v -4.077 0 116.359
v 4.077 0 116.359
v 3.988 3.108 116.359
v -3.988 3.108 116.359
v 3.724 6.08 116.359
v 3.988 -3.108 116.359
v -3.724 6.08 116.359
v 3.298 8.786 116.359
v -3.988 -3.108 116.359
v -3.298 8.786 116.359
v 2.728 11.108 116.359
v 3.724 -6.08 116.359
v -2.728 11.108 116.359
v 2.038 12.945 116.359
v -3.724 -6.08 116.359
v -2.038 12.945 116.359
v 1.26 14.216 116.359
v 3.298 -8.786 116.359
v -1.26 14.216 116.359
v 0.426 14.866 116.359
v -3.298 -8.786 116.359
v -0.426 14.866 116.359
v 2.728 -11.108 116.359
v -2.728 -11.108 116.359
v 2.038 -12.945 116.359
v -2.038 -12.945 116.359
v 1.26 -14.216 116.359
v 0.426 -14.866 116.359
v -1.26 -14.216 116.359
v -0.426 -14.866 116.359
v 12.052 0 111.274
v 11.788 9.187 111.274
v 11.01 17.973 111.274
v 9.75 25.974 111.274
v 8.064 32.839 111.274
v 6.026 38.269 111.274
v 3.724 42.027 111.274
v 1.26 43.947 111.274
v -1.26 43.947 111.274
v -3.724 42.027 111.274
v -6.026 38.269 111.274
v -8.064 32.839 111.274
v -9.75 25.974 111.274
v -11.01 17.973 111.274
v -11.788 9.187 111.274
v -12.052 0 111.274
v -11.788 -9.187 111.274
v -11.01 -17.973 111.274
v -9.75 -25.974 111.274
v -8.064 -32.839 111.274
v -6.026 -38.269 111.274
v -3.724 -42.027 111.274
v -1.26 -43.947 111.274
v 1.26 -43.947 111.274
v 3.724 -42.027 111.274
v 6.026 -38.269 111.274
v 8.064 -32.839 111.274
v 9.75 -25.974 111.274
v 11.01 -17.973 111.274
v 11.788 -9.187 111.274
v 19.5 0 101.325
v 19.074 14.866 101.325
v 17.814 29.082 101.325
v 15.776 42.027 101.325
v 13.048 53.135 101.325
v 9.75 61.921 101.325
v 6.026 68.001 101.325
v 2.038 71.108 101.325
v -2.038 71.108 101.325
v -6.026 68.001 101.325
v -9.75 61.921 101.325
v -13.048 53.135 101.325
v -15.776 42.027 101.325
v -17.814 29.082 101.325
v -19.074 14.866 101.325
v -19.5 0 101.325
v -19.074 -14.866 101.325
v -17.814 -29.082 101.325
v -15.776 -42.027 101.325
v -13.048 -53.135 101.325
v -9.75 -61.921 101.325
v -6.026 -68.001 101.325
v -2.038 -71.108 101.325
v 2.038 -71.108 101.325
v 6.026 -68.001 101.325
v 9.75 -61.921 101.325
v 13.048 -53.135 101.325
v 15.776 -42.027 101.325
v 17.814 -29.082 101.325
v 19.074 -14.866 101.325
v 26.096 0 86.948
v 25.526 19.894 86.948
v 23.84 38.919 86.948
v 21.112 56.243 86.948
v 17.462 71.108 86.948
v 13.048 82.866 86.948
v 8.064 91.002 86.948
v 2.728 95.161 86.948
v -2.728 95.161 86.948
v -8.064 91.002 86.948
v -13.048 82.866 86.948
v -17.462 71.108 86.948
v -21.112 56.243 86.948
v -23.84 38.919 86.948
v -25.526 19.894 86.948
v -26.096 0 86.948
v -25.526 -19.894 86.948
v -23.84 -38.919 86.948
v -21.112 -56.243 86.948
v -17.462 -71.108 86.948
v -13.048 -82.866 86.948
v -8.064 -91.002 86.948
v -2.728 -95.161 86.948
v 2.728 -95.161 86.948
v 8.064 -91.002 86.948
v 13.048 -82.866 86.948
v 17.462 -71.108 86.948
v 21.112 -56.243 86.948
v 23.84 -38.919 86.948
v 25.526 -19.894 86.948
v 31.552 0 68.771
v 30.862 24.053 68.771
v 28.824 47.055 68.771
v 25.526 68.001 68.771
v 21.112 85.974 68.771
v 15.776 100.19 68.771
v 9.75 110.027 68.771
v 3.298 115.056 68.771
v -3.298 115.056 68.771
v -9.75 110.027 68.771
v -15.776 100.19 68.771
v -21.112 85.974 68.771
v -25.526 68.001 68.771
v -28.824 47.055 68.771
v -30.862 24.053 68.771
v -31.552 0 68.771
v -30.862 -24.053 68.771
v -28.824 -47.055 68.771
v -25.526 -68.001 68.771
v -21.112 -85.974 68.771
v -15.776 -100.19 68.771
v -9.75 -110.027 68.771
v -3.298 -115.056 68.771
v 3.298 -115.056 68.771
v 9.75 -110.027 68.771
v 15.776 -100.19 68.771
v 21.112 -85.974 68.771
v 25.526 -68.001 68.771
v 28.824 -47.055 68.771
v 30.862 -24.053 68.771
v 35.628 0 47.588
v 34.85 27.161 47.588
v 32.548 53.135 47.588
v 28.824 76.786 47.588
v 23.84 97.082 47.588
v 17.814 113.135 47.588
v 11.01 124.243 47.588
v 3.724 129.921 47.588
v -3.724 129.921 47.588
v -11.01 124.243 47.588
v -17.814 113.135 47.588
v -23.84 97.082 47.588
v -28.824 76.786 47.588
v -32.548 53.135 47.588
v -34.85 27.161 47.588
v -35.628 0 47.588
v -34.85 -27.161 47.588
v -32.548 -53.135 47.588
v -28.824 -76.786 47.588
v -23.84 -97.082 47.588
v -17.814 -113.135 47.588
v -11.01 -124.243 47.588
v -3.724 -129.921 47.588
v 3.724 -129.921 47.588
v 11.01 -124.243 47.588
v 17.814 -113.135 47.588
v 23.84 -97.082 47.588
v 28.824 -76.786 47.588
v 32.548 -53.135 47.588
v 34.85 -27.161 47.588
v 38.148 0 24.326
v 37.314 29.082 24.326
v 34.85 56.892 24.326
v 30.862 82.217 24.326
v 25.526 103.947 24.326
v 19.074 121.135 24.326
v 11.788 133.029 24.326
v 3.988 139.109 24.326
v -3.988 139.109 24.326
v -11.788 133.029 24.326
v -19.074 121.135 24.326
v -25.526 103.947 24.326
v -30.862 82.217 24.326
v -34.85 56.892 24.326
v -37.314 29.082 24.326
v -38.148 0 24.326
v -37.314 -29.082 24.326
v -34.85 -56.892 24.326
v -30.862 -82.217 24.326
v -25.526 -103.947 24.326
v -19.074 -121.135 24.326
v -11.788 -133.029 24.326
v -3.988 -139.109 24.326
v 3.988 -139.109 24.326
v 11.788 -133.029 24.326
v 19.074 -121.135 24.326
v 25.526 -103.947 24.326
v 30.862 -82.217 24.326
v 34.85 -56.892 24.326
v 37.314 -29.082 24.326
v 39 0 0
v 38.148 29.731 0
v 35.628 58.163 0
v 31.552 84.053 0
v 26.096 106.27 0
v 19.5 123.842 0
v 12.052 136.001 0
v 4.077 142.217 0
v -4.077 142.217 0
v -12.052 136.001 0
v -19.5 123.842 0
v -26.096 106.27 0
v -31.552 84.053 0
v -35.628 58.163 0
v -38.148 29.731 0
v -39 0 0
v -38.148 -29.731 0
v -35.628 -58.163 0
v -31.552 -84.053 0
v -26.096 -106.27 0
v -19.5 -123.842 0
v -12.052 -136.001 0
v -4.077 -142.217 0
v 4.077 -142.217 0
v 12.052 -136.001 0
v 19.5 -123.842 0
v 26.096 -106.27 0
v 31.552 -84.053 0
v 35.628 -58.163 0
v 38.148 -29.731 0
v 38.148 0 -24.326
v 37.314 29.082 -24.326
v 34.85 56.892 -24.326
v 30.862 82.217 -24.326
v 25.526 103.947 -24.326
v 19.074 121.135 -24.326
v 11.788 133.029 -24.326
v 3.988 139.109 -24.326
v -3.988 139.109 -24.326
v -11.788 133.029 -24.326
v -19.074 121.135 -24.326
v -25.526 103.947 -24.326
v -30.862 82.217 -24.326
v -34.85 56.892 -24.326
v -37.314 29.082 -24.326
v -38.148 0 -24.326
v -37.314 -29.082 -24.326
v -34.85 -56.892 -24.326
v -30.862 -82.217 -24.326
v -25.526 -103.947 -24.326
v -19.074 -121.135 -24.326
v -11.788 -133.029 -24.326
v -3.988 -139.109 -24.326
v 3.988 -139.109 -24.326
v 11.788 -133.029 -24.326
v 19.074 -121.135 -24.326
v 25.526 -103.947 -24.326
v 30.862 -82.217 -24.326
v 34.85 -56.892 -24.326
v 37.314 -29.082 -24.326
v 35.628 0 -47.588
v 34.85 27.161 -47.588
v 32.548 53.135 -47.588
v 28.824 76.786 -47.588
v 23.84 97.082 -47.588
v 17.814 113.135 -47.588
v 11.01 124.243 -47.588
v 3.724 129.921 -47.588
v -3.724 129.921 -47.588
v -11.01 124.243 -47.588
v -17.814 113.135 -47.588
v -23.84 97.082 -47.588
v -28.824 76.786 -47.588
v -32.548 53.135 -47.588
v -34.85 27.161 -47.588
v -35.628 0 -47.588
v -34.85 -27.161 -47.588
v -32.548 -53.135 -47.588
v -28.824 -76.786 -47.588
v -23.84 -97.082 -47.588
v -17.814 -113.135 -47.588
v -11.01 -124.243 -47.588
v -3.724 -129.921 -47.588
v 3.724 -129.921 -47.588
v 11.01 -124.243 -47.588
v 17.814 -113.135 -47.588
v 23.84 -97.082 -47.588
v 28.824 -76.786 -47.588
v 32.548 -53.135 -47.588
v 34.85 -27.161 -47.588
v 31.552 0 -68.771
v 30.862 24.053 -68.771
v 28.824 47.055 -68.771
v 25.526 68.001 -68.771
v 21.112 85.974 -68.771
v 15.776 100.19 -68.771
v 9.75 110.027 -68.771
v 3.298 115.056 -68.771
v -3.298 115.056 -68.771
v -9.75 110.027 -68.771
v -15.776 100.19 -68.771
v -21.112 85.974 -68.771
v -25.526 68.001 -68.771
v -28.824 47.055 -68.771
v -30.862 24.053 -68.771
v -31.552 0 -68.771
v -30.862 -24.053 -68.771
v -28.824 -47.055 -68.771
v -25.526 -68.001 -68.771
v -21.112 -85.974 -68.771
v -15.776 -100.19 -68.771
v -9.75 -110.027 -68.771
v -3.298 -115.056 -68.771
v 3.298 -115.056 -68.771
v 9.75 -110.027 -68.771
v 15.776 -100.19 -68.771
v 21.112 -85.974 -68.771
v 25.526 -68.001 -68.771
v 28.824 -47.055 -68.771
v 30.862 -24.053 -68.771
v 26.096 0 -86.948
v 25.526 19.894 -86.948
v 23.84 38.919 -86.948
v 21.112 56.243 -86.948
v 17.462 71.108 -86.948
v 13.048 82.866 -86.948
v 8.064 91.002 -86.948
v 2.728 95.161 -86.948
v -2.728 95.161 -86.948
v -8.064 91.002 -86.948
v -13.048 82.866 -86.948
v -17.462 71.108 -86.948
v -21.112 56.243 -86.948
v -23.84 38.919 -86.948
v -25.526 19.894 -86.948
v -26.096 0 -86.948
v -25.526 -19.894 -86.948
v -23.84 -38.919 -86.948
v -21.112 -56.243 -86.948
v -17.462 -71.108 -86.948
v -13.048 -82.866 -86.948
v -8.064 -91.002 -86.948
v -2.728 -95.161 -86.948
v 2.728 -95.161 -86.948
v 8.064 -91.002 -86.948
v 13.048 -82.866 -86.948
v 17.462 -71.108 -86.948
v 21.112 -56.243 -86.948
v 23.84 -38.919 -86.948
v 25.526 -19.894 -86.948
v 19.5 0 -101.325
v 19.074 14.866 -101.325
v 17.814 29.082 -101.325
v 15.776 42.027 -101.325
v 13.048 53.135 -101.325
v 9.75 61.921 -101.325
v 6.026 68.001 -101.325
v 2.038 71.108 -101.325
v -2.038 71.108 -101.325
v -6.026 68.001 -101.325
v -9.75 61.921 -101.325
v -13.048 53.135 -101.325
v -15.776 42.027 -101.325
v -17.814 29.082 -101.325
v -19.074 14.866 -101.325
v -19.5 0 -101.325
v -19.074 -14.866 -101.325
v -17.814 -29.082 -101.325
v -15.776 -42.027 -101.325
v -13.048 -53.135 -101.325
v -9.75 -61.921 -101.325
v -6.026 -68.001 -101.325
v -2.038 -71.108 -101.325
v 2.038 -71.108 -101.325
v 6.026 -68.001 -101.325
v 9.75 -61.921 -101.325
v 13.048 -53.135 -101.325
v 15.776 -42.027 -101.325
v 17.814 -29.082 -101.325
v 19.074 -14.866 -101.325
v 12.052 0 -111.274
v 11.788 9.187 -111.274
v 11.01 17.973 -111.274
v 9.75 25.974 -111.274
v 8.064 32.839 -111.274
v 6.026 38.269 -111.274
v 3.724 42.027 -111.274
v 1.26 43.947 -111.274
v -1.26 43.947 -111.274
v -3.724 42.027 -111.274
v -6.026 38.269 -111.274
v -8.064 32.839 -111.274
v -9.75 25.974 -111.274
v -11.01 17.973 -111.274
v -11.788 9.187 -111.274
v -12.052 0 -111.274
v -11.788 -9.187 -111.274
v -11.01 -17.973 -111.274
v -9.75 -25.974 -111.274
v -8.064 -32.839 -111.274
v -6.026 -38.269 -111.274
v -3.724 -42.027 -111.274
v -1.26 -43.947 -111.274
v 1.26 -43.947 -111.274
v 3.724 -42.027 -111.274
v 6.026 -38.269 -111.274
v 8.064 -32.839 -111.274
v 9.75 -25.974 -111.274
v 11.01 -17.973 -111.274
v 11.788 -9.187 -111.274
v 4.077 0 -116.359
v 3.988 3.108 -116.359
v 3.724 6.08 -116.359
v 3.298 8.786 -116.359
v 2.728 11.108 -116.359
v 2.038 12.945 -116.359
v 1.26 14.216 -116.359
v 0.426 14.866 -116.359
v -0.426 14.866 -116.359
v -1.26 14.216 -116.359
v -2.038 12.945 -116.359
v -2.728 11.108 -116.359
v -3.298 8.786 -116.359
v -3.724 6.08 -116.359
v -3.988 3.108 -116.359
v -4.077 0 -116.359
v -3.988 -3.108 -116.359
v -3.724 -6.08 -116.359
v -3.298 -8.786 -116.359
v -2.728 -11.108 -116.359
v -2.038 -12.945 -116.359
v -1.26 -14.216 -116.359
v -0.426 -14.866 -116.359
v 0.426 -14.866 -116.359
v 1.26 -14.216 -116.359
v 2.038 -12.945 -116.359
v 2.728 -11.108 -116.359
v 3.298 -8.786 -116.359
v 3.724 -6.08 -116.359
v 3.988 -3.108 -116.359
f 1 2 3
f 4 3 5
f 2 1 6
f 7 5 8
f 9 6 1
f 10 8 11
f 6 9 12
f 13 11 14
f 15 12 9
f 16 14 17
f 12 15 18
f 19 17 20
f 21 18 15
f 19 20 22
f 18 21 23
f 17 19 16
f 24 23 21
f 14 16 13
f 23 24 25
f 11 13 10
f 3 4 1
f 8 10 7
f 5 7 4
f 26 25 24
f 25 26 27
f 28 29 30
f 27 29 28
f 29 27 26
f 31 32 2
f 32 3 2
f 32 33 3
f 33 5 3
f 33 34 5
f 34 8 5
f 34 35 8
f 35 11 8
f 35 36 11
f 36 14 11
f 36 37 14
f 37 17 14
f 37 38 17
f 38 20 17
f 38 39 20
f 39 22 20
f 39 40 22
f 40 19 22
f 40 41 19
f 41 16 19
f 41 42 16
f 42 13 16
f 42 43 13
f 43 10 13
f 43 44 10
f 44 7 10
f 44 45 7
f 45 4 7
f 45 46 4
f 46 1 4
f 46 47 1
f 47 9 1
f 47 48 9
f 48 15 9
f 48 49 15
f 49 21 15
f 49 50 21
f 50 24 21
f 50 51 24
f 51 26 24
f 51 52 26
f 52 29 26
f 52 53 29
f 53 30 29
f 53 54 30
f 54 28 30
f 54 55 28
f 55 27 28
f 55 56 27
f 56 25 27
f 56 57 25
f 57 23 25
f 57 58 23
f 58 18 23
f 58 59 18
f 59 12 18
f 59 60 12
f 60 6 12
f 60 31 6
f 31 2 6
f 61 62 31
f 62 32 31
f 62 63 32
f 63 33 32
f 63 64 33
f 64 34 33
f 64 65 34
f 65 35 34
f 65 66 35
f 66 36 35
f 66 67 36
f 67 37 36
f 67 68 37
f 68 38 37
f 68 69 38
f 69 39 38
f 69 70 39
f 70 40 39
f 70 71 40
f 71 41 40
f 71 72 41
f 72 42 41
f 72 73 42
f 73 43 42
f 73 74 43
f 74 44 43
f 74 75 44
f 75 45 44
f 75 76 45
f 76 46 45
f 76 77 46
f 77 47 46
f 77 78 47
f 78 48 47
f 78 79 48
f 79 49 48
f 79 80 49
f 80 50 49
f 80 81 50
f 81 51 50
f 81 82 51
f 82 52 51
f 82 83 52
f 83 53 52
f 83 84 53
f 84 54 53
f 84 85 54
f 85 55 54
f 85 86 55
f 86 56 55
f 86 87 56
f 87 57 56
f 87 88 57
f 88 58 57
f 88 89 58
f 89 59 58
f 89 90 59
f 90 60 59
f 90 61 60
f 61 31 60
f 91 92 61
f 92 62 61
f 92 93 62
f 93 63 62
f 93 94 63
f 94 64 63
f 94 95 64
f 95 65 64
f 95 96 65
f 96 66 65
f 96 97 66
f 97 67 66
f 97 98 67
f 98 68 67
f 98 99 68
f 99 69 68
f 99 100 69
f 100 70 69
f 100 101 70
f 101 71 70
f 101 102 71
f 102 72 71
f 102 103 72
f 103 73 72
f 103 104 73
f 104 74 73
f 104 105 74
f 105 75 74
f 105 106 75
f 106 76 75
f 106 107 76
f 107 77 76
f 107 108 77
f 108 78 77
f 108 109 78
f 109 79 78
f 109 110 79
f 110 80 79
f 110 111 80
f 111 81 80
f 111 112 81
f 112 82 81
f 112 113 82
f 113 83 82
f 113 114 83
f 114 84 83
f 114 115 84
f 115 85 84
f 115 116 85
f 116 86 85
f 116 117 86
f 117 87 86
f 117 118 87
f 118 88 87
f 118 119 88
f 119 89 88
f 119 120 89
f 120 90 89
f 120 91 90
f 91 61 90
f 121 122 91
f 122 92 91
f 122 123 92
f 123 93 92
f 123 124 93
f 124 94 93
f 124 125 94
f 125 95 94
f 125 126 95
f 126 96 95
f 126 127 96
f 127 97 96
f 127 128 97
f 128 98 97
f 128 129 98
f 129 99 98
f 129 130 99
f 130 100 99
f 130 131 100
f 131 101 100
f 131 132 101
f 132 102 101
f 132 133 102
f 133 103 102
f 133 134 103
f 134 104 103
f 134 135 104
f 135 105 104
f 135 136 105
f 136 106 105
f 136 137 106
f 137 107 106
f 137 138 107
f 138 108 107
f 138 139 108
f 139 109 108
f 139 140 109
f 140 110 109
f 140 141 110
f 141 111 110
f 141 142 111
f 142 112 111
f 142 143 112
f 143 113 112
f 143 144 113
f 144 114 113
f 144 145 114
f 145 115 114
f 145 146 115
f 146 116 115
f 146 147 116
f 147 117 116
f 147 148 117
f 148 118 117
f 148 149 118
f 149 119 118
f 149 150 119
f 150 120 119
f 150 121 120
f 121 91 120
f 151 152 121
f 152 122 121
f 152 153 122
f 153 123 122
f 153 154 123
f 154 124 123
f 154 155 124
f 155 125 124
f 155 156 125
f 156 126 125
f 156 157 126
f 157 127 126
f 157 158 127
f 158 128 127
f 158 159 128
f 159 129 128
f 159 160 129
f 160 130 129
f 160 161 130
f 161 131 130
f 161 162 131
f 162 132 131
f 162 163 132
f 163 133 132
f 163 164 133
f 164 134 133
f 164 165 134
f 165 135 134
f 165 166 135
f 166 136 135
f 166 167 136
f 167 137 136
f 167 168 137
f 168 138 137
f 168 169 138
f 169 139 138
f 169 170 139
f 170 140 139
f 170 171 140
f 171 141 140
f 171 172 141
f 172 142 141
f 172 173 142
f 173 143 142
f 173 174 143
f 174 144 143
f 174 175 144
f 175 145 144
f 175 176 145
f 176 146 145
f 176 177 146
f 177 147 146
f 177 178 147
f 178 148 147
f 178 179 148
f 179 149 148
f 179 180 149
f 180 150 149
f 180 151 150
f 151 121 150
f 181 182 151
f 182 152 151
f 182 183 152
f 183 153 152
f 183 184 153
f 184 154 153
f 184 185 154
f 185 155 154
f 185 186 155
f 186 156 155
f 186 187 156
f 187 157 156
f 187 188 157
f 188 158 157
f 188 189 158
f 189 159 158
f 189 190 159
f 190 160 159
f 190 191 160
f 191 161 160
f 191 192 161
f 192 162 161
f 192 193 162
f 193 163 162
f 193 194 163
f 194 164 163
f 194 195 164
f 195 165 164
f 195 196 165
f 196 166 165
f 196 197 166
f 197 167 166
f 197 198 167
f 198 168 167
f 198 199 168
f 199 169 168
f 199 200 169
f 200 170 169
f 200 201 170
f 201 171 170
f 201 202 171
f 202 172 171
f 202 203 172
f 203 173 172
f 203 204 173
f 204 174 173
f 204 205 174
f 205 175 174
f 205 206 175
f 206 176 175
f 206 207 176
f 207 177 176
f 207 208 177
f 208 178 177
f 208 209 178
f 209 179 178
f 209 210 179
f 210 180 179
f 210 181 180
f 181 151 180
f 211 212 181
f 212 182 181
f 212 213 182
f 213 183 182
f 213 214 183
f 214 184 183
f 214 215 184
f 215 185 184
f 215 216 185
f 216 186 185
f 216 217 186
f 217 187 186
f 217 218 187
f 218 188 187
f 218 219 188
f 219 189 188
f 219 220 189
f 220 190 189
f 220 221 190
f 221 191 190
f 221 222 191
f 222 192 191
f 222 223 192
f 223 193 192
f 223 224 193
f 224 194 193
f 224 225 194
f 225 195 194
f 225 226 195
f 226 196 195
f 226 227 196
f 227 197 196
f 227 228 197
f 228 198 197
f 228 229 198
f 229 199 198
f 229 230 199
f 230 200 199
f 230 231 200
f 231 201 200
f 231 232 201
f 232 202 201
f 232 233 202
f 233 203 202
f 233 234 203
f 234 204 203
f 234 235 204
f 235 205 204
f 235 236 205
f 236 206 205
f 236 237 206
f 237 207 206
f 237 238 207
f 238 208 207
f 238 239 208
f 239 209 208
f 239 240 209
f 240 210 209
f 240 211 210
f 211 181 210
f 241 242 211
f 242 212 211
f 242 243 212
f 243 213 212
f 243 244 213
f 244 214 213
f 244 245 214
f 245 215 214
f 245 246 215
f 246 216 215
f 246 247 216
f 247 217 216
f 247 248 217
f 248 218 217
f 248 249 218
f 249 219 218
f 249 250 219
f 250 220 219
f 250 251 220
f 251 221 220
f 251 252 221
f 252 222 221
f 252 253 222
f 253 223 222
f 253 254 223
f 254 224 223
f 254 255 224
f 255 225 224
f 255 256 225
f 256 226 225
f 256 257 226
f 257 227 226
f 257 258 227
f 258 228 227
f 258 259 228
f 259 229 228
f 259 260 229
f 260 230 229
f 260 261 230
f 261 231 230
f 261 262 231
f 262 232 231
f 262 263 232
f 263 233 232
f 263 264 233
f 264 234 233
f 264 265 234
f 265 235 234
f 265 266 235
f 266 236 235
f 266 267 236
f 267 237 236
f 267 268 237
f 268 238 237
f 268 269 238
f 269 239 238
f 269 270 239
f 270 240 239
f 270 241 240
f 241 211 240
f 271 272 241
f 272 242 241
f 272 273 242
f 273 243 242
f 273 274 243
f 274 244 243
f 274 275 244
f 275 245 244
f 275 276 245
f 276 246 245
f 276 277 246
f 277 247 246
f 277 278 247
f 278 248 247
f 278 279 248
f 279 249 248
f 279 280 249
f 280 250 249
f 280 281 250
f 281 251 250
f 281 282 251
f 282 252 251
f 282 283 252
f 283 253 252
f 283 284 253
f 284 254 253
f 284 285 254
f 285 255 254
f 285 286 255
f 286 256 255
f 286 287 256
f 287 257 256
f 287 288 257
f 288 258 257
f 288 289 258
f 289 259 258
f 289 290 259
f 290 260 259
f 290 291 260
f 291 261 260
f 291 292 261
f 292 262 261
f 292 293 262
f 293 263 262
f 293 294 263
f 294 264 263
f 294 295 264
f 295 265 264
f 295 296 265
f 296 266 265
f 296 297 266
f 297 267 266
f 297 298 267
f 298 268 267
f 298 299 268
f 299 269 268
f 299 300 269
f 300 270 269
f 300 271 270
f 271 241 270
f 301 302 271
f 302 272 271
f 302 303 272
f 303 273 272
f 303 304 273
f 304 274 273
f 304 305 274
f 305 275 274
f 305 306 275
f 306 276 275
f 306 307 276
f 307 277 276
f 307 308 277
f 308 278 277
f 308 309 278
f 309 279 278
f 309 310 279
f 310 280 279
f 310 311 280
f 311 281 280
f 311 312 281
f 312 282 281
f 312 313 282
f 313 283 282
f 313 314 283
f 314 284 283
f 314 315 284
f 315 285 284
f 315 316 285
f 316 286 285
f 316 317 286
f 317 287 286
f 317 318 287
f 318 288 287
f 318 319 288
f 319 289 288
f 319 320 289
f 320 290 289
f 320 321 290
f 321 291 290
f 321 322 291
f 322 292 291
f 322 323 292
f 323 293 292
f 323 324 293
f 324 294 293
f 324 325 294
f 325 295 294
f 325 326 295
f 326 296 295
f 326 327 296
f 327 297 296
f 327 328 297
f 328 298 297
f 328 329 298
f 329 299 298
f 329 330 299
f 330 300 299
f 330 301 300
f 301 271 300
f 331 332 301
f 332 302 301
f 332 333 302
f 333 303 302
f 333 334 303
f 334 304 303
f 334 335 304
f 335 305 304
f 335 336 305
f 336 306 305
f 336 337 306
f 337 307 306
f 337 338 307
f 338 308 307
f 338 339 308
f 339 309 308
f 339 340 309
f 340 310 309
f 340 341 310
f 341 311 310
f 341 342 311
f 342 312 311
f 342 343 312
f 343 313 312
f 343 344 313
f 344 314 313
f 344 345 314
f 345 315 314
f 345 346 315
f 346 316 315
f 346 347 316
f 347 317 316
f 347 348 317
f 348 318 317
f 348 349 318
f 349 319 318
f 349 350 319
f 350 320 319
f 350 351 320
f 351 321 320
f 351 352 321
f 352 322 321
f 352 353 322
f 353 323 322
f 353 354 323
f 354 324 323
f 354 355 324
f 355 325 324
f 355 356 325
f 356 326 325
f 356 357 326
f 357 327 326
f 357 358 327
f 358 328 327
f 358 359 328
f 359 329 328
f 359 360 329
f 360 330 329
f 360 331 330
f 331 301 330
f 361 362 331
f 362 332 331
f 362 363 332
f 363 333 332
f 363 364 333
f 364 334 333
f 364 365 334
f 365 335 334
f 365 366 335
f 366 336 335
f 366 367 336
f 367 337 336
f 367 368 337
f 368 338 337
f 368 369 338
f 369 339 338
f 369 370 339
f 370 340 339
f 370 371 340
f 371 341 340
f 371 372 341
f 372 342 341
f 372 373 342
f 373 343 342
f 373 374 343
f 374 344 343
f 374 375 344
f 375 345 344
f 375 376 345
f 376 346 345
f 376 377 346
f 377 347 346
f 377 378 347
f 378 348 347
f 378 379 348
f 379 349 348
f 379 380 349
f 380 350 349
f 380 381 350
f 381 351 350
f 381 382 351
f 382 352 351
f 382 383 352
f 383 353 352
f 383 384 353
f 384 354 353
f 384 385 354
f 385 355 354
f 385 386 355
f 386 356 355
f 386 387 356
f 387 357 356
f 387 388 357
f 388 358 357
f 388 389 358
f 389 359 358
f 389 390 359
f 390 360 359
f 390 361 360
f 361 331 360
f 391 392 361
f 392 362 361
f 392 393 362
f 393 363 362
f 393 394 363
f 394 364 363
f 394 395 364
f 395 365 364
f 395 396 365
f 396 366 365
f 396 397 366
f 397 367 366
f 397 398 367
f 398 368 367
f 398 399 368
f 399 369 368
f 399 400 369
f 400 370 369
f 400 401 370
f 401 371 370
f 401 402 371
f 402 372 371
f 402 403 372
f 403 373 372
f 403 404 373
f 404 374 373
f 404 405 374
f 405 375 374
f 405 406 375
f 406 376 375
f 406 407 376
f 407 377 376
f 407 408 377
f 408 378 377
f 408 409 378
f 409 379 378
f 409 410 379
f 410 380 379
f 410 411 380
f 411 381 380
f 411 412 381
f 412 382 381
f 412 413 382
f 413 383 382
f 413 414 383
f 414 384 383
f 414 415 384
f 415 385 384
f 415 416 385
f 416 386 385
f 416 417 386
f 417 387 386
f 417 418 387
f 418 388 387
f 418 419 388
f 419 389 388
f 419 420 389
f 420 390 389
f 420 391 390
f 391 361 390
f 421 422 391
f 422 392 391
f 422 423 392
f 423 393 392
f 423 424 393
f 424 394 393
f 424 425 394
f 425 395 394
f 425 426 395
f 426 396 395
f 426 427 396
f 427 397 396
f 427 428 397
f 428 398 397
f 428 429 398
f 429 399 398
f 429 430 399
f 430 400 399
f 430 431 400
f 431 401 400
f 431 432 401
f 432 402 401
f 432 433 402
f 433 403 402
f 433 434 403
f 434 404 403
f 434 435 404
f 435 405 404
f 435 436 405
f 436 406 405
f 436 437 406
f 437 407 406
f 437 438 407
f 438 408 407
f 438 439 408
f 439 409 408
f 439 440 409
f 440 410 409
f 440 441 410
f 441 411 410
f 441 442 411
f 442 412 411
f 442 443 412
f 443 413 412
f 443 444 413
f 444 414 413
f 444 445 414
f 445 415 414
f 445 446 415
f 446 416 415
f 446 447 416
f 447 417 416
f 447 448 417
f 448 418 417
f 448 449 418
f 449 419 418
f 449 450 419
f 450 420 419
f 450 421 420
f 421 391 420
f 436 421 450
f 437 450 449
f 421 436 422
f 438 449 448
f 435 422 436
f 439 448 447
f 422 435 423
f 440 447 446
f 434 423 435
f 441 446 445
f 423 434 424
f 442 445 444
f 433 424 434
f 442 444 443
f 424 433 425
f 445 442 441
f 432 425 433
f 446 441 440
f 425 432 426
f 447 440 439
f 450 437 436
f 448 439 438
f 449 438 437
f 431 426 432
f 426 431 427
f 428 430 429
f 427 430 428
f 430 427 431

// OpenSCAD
// Generated by SolidPython 1.0.1 on 2020-07-29 00:46:45


scale(v = [3, 11, 9]) {
	sphere(r = 13);
}
/***********************************************
*********      SolidPython code:      **********
************************************************
 
# import packages: SolidPython
from solid import *
from solid.utils import *
from itertools import chain, combinations, permutations


class Resize:

    def __init__(self, scad_file):
        self.scad_file = scad_file
        #self.scad_file = import_scad(scad_file)
        # cone/cylinder param:
        self.r1 = 0
        self.r2 = 0
        self.h = 0
        # rectangular prism param:
        self.w = 0
        self.l = 0
        # ellipse param:
        self.r = 0

    # import OpenScad code (file name corresponds to shape)


    # classify shape + parameters
    def assign(self, param1, param2, param3):
        if self.scad_file == 'cone.scad':
            self.r1 = param1
            self.r2 = param2
            self.h = param3
        elif self.scad_file == 'cylinder.scad':
            self.r1 = param1
            self.r2 = param2
            self.h = param3
        elif self.scad_file == 'rectangularPrism.scad':
            self.h = param1
            self.l = param2
            self.w = param3
        else:
            self.r = param1
            self.h = param2

    # resize parameters
    def iterate(self):
        x = range(3, 20, 2)
        i = 1
        if self.scad_file == 'cone.scad':
            tempList = list(permutations(x, 2))
            for temp in tempList:
                param1 = temp[0]
                param2 = temp[1]
                filepath = 'produced_scad_files/' + 'cone' + str(param1) + '_' + str(param2) + '_' + '.scad'
                scad_render_to_file(cylinder(h=param1, r1=param2, r2=0), filepath)

        elif self.scad_file == 'cylinder.scad':
            tempList = list(permutations(x, 3))
            for temp in tempList:
                param1 = temp[0]
                param2 = temp[1]
                filepath = 'produced_scad_files/' + 'cylinder' + str(param1) + '_' + str(param2) + '_' + '.scad'
                scad_render_to_file(cylinder(h=param1, r1=param2, r2=param2), filepath)

        elif self.scad_file == 'rectangularPrism.scad':
            tempList = list(permutations(x, 3))
            for temp in tempList:
                param1 = temp[0]
                param2 = temp[1]
                param3 = temp[2]
                filepath = 'produced_scad_files/' + 'rectangularPrism' + str(param1) + '_' + str(param2) + '_' + str(
                    param3) + '.scad'
                scad_render_to_file(cube(size=(param1, param2, param3)), filepath)

        elif self.scad_file == 'ellipse.scad':
            tempList = list(permutations(x, 4))
            for temp in tempList:
                param1 = temp[0]
                param2 = temp[1]
                param3 = temp[2]
                param4 = temp[3]
                filepath = 'produced_scad_files/' + 'ellipse' + str(param1) + '_' + str(param2) + '_' + str(param3) + '_' + str(param4) + '.scad'
                scad_render_to_file(scale([param1, param2, param3])(sphere(r=param4)), filepath)

    def render_to_scadfile(self):
        scad_render_to_file(scad, 'example.scad') 
 
************************************************/
